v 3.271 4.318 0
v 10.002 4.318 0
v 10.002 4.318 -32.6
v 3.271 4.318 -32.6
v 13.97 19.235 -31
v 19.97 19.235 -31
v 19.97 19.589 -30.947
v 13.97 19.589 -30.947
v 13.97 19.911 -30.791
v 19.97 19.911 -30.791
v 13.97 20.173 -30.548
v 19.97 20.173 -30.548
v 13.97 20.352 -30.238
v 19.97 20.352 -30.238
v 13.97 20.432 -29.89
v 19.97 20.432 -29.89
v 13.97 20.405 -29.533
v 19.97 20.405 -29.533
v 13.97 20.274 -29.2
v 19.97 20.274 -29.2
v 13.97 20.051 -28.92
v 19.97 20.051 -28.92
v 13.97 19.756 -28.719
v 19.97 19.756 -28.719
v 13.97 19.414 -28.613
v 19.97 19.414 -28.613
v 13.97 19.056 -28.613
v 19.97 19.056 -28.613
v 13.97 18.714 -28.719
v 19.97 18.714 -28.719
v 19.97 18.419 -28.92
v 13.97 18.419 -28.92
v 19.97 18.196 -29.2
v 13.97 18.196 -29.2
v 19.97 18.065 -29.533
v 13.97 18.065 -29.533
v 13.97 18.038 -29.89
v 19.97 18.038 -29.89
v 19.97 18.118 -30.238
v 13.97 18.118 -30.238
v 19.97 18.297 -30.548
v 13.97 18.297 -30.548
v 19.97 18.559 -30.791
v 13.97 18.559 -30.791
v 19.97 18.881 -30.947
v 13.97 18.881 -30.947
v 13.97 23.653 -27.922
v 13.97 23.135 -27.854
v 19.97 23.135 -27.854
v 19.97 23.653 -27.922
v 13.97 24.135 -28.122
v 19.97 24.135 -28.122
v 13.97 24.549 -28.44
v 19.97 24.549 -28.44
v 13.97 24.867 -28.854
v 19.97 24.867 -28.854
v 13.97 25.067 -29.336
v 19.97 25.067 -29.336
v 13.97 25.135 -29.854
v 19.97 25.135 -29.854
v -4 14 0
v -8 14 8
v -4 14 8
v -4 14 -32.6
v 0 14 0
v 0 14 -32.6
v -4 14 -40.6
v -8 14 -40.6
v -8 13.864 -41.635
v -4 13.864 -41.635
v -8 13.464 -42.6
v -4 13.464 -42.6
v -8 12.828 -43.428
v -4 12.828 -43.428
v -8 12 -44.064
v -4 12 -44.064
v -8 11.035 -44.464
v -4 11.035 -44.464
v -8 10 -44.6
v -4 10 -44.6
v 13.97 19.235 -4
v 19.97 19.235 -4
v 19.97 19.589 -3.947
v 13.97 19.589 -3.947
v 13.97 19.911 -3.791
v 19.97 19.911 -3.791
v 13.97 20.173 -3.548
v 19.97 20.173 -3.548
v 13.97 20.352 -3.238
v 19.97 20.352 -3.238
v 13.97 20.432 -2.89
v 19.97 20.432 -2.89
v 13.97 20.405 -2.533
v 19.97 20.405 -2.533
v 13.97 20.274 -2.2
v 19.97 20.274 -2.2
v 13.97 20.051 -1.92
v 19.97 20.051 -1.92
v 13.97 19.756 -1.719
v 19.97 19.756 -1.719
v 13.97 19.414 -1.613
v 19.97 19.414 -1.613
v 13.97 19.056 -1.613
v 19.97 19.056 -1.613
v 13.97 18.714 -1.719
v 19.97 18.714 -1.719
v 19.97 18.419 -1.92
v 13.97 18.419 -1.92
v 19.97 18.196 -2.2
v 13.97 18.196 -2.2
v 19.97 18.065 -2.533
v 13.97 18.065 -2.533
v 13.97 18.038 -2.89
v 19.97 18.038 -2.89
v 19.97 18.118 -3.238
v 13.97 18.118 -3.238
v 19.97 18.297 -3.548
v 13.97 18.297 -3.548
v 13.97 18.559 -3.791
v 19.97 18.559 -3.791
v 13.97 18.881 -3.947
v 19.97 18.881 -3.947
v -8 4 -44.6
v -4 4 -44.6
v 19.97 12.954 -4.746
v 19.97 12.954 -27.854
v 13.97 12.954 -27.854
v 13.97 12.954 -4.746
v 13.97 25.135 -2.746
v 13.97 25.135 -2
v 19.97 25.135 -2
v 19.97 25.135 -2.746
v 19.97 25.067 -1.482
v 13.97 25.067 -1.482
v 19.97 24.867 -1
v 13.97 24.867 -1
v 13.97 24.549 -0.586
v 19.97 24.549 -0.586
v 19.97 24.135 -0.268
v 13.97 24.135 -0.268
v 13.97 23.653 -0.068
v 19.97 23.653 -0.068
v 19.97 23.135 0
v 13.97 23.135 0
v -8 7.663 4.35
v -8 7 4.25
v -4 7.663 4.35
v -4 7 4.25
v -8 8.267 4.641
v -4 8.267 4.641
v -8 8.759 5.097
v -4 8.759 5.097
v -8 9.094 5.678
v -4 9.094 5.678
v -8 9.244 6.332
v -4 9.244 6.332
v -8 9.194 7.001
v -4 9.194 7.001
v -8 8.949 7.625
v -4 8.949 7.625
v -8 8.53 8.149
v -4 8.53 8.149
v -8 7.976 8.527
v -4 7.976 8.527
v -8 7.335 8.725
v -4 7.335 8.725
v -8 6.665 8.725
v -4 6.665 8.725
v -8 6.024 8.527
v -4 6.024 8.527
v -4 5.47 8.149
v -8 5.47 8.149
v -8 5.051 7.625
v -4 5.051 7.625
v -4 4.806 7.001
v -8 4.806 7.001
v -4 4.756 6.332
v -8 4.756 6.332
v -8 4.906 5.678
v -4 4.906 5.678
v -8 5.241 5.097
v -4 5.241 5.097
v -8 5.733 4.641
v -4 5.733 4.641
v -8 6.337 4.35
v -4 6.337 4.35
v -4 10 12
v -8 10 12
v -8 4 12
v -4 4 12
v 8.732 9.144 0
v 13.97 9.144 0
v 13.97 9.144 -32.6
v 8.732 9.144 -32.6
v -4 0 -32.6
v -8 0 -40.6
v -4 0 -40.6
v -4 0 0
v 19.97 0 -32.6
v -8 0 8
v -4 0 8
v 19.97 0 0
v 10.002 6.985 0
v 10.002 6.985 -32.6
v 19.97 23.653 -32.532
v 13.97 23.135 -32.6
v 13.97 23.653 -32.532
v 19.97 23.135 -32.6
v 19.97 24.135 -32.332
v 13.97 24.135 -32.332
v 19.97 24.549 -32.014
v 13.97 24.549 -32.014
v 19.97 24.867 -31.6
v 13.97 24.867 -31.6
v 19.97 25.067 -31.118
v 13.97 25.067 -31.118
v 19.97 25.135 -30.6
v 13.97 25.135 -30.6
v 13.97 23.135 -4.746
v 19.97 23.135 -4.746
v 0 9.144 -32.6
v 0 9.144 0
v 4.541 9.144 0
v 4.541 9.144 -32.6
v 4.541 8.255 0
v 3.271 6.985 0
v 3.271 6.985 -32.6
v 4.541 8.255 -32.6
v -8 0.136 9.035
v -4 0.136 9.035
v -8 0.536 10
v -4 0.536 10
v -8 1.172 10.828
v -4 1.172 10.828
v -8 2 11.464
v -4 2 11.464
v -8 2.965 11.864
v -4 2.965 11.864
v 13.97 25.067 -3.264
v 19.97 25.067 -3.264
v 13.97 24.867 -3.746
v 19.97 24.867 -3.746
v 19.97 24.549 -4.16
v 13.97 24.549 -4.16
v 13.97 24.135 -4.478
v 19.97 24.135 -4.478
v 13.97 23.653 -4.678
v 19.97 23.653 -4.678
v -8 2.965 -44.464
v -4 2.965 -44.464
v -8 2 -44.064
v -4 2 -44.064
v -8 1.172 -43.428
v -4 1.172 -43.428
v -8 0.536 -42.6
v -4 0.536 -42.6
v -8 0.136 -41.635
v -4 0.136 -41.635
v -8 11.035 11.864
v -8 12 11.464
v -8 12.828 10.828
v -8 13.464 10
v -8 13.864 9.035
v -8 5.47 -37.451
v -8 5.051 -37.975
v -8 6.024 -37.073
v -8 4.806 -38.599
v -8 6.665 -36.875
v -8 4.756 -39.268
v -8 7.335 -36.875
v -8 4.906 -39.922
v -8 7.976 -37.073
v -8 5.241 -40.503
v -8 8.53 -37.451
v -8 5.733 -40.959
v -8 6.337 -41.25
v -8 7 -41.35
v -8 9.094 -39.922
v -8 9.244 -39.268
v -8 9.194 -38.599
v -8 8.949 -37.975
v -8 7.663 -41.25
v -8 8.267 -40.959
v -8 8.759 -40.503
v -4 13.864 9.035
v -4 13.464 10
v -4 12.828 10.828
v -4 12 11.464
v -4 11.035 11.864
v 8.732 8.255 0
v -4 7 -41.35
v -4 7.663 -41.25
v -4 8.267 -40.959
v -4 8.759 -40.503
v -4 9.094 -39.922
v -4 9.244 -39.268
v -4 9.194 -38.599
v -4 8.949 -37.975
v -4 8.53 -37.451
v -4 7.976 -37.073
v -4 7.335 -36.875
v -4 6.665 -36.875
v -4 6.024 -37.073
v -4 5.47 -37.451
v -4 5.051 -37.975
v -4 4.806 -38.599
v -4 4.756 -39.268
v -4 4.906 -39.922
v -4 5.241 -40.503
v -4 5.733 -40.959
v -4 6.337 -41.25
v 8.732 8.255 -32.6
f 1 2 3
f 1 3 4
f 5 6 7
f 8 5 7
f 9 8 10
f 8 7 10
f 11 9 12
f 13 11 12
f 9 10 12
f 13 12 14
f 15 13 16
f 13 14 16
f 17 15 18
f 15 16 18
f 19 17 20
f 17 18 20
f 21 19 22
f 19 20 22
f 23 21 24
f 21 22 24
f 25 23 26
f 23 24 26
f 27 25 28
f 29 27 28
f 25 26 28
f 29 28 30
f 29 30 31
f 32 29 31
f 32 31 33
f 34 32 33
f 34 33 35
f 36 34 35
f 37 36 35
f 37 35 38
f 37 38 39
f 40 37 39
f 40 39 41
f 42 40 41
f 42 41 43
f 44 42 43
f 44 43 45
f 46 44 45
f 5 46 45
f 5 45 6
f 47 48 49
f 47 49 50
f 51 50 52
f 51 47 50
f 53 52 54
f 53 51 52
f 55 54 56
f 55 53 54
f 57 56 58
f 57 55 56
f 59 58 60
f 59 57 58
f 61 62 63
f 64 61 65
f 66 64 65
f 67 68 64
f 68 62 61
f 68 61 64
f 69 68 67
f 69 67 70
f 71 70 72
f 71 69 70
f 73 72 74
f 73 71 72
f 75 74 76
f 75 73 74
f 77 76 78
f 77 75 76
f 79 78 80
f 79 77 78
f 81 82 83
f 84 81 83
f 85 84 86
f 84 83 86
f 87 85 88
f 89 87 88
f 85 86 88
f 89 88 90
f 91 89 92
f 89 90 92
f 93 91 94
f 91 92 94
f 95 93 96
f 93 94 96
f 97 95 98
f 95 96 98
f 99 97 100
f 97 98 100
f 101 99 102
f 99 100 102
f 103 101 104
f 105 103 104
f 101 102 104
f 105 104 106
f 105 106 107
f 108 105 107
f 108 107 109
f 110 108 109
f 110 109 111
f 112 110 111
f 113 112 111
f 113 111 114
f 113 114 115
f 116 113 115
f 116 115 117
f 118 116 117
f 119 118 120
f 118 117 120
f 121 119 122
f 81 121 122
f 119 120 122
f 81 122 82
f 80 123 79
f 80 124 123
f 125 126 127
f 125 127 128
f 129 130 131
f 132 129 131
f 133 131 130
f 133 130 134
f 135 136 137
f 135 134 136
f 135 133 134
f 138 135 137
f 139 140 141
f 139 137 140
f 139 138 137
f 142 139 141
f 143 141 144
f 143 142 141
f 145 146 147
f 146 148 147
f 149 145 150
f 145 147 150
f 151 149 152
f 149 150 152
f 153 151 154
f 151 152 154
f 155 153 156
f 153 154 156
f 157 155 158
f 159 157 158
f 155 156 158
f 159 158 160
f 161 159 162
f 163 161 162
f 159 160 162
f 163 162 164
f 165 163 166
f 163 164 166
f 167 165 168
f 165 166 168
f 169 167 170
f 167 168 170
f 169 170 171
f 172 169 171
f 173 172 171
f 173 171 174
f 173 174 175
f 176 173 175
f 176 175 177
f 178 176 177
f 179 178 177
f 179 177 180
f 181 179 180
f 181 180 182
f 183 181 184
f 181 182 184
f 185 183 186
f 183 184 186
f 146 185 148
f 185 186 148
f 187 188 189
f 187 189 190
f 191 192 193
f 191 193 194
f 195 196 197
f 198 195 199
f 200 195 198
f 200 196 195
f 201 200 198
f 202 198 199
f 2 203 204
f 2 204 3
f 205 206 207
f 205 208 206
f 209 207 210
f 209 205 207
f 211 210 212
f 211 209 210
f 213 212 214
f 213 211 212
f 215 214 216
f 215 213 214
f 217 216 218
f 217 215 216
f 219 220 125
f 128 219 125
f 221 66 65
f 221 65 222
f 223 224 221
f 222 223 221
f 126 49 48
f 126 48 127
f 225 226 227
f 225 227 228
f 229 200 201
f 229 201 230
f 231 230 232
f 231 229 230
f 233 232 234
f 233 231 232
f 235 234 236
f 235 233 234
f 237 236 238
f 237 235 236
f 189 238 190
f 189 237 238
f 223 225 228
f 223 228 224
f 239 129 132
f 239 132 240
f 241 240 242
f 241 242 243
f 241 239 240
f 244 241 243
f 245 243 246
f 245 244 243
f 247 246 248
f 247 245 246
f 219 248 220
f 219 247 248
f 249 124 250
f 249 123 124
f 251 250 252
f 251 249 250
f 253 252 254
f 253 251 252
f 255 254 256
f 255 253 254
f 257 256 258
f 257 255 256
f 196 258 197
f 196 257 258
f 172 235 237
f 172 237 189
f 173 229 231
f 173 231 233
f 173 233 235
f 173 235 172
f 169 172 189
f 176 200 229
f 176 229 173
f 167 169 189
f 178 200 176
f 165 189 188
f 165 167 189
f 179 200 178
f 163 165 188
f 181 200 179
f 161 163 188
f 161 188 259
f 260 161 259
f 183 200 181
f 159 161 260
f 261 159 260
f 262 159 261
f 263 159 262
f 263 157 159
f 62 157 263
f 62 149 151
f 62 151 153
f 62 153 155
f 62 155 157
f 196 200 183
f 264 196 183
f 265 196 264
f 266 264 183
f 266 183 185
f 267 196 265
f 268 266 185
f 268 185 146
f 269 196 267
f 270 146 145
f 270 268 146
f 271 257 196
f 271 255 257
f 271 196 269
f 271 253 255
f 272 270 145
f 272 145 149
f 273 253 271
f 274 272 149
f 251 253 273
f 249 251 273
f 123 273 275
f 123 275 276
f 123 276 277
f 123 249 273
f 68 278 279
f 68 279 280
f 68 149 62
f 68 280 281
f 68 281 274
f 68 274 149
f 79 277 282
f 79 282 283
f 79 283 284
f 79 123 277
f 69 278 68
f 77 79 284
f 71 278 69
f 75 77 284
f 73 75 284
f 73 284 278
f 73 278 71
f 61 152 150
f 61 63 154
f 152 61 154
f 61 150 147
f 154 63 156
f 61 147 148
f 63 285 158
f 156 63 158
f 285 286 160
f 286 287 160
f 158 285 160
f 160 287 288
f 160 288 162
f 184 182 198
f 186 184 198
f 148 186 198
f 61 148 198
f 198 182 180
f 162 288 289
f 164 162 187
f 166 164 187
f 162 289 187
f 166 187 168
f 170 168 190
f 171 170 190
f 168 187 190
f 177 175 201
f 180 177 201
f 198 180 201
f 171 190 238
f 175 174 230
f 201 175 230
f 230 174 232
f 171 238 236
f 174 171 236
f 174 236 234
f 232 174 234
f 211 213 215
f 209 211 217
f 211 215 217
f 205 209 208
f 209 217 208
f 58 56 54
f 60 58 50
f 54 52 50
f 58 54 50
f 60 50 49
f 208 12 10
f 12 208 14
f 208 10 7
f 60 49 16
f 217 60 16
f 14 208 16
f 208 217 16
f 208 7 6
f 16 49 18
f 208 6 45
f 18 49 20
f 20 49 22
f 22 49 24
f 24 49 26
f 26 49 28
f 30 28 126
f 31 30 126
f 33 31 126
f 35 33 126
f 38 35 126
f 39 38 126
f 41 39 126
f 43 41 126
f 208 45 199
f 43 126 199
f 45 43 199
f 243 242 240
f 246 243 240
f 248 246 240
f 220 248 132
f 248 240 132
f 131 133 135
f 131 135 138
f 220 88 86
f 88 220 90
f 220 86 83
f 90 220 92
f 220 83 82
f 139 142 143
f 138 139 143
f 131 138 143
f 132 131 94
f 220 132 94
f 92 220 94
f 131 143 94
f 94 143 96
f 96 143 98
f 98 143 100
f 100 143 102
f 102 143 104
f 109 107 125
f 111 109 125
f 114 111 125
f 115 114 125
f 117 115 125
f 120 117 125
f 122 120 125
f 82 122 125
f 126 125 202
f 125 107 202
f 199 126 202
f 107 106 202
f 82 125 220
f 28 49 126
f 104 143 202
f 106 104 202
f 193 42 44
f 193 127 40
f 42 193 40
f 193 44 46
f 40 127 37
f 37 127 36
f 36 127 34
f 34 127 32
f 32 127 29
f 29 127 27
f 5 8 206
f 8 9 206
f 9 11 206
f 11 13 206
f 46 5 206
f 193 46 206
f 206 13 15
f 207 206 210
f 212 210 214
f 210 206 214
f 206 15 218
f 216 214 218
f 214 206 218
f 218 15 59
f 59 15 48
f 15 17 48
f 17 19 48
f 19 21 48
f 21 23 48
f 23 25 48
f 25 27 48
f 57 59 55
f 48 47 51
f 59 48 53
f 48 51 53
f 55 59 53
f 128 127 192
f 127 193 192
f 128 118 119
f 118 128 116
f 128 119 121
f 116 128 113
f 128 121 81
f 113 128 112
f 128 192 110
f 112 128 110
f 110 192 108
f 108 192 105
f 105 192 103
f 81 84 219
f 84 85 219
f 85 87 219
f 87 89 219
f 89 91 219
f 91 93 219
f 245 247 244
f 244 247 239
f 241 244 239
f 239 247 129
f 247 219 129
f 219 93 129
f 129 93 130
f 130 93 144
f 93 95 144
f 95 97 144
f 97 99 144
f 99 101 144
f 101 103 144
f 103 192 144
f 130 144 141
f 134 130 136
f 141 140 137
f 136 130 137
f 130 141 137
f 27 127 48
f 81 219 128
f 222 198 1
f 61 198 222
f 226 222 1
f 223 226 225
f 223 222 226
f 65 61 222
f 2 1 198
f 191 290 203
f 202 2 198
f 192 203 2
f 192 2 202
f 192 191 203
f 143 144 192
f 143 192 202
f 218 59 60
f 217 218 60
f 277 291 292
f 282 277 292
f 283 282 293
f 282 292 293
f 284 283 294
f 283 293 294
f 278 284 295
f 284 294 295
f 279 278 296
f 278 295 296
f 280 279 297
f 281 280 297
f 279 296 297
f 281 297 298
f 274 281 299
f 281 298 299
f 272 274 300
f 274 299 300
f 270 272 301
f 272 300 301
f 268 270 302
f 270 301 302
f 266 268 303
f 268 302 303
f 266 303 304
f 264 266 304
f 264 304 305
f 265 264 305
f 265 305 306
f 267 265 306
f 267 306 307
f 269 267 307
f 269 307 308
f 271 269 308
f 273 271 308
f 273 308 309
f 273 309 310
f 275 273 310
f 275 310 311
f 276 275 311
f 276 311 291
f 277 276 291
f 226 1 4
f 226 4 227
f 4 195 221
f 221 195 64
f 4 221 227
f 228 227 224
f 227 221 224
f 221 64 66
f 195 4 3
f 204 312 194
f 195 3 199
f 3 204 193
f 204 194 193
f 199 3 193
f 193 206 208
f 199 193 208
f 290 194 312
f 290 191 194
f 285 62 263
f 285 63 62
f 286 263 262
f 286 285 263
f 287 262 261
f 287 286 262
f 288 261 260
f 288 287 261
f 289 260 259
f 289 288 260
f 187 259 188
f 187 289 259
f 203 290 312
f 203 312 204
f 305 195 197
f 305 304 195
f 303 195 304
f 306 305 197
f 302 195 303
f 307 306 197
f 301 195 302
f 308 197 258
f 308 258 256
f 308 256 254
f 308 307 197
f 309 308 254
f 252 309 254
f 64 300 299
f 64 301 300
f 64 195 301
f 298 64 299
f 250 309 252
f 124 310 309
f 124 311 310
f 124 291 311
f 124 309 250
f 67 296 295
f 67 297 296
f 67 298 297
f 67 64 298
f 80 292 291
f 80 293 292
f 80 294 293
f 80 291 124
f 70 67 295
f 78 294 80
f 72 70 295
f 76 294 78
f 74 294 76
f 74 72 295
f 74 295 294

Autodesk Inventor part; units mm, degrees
ref_plane "YZ Plane" through (0, 0, 0) normal (1, 0, 0) x (0, 1, 0)
ref_plane "XZ Plane" through (0, 0, 0) normal (0, 1, 0) x (-1, 0, 0)
ref_plane "XY Plane" through (0, 0, 0) normal (0, 0, 1) x (1, 0, 0)
sketch "Náčrt1" plane through (0, 0, 0) normal (0, 0, 1) x (1, 0, 0)
  line L0 (13.97, 23.865) -> (13.97, 9.144)
  line L1 (0, 9.144) -> (0, 0)
  line L2 (4.5409, 9.144) -> (0, 9.144)
  line L3 (4.5409, 8.255) -> (4.5409, 9.144)
  line L4 (3.2709, 6.985) -> (4.5409, 8.255)
  line L5 (3.2709, 4.318) -> (3.2709, 6.985)
  line L6 (8.7319, 9.144) -> (8.7319, 8.255)
  line L7 (13.97, 9.144) -> (8.7319, 9.144)
  line L8 (8.7319, 8.255) -> (10.0019, 6.985)
  line L9 (10.0019, 6.985) -> (10.0019, 4.318)
  line L10 (10.0019, 4.318) -> (3.2709, 4.318)
  line L11 (0, 0) -> (19.97, 0)
  line L12 (13.97, 22.5956) -> (13.97, 25.1349)
  line L13 (13.97, 20.4353) -> (13.97, 18.035)
  line L14 (13.97, 25.1349) -> (19.97, 25.1349)
  line L15 (19.97, 25.1349) -> (19.97, 0)
extrude "Vysunutí1" add sketch "Náčrt1" against normal blind 32.6
sketch "Náčrt2" plane through (19.97, 0, 0) normal (1, 0, 0) x (0, 0, -1)
  line L0 (0, 25.1349) -> (32.6, 25.1349) projected
  line L1 (16.3, 25.1349) -> (4.746, 25.1349)
  line L2 (4.746, 25.1349) -> (4.746, 12.9539)
  line L3 (16.3, 25.1349) -> (27.854, 25.1349)
  line L4 (27.854, 25.1349) -> (27.854, 12.9539)
  line L5 (27.854, 12.9539) -> (4.746, 12.9539)
  circle A0 centre (2.8, 19.2349) radius 1.2
  line L6 (16.3, 25.1349) -> (16.3, 15.9225)
  circle A1 centre (29.8, 19.2349) radius 1.2
  point P0 (0, 0)
  point P1 (4.746, 19.0444)
  dimension "d2" = 11.554
  dimension "d3" = 12.181
  dimension "d4" = 11.554
  dimension "d7" = 2.4
  dimension "d8" = 5.9
  dimension "d9" = 1.946
extrude "Vysunutí2" cut sketch "Náčrt2" against normal blind 32.6 contours L0 L4 L5 L2
extrude "Vysunutí3" cut sketch "Náčrt2" against normal blind 32.6 contours A0 | A1
fillet "Zaoblení1" radius 2 4 edges at (16.97, 25.1349, 0) (16.97, 25.1349, -4.746) (16.97, 25.1349, -27.854) (16.97, 25.1349, -32.6)
sketch "Náčrt3" plane through (0, 0, 0) normal (0, -1, 0) x (1, 0, 0)
  point P0 (0, 0)
sketch "Náčrt4" plane through (0, 0, 0) normal (0, 0, 1) x (1, 0, 0)
  line L0 (13.97, 23.1349) -> (19.97, 23.1349) projected
  line L1 (13.97, 23.1349) -> (13.97, 9.144) projected
  line L2 (13.97, 9.144) -> (8.7319, 9.144) projected
  line L3 (8.7319, 9.144) -> (8.7319, 8.255) projected
  line L4 (8.7319, 8.255) -> (10.0019, 6.985) projected
  line L5 (10.0019, 6.985) -> (10.0019, 4.318) projected
  line L6 (10.0019, 4.318) -> (3.2709, 4.318) projected
  line L7 (3.2709, 4.318) -> (3.2709, 6.985) projected
  line L8 (3.2709, 6.985) -> (4.5409, 8.255) projected
  line L9 (4.5409, 8.255) -> (4.5409, 9.144) projected
  line L10 (4.5409, 9.144) -> (0, 9.144) projected
  line L11 (0, 9.144) -> (0, 0) projected
  line L12 (0, 0) -> (19.97, 0) projected
  line L13 (19.97, 0) -> (19.97, 23.1349) projected
  line L14 (0, 0) -> (-8, 0)
  line L15 (-8, 0) -> (-8, 14)
  line L16 (-8, 14) -> (0, 14)
  line L17 (0, 14) -> (0, 0)
  dimension "d13" = 14
  dimension "d14" = 8
extrude "Vysunutí4" add sketch "Náčrt4" along normal blind 12 and the other way blind 32.6 contours L14 L15 L16 L17 L11
sketch "Náčrt5" plane through (0, 0, 0) normal (1, 0, 0) x (0, 0, -1)
  line L0 (0, 9.144) -> (0, 0) projected
  line L1 (0, 9.144) -> (32.6, 9.144) projected
  line L2 (32.6, 14) -> (32.6, 9.144) projected
  line L3 (32.6, 14) -> (-12, 14) projected
  line L4 (-12, 0) -> (-12, 14) projected
  line L5 (0, 0) -> (-12, 0) projected
  circle A0 centre (-6.5, 7) radius 2.25
  line L6 (27.854, 12.9539) -> (4.746, 12.9539) projected
  line L7 (16.3, 12.9539) -> (16.3, -5.3216)
  line L8 (32.6, 9.144) -> (32.6, 0)
  line L9 (44.6, 0) -> (44.6, 14)
  line L10 (32.6, 0) -> (44.6, 0)
  circle A1 centre (39.1, 7) radius 2.25
  line L11 (44.6, 14) -> (32.6, 14)
  line L12 (32.6, 14) -> (32.6, 0)
  dimension "d19" = 4.5
  dimension "d20" = 7
  dimension "d21" = 5.5
extrude "Vysunutí5" add sketch "Náčrt5" against normal up to surface (8 mm away) contours L2 L11 L9 L10 L8 | A0
sketch "Náčrt6" plane through (0, 0, 12) normal (0, 0, 1) x (1, 0, 0)
  line L0 (-8, 14) -> (-8, 0) projected
  line L1 (-8, 0) -> (0, 0) projected
  line L2 (0, 0) -> (0, 14) projected
  line L3 (0, 14) -> (-8, 14) projected
  line L4 (0, 14) -> (-4, 14)
  line L5 (-4, 14) -> (-4, 0)
  line L6 (-4, 0) -> (0, 0)
  line L7 (0, 0) -> (0, 14)
  dimension "d24" = 4
extrude "Vysunutí6" cut sketch "Náčrt6" against normal blind 12 contours L3 L2 L1 L5
extrude "Vysunutí7" cut sketch "Náčrt5" against normal blind 4 contours L2 L11 L9 L10 L8 | A0
sketch "Náčrt7" plane through (-4, 0, 12) normal (1, 0, 0) x (0, 0, -1)
  circle A0 centre (51.1, 7) radius 2.25 projected
  line L0 (0, 0) -> (0, 14) projected
  line L1 (12, 0) -> (0, 0) projected
  line L2 (12, 0) -> (12, 14) projected
  line L3 (0, 14) -> (12, 14) projected
  line L4 (44.6, 0) -> (44.6, 14) projected
  line L5 (56.6, 0) -> (44.6, 0) projected
  line L6 (56.6, 14) -> (56.6, 0) projected
  line L7 (44.6, 14) -> (56.6, 14) projected
  circle A1 centre (51.1, 7) radius 2.25 projected
  line L8 (12, 0) -> (44.6, 0) projected
  circle A2 centre (5.5, 7) radius 2.25
  line L9 (44.6, 14) -> (12, 14) projected
  point P0 (0, 7)
  dimension "d29" = 4.5
  dimension "d30" = 5.5
extrude "Vysunutí8" cut sketch "Náčrt7" against normal blind 4 contours A2
fillet "Zaoblení2" radius 4 4 edges at (-6, 14, -44.6) (-6, 0, -44.6) (-6, 14, 12) (-6, 0, 12)
properties part number "Motor_holder_Vertical" material "Měď"
